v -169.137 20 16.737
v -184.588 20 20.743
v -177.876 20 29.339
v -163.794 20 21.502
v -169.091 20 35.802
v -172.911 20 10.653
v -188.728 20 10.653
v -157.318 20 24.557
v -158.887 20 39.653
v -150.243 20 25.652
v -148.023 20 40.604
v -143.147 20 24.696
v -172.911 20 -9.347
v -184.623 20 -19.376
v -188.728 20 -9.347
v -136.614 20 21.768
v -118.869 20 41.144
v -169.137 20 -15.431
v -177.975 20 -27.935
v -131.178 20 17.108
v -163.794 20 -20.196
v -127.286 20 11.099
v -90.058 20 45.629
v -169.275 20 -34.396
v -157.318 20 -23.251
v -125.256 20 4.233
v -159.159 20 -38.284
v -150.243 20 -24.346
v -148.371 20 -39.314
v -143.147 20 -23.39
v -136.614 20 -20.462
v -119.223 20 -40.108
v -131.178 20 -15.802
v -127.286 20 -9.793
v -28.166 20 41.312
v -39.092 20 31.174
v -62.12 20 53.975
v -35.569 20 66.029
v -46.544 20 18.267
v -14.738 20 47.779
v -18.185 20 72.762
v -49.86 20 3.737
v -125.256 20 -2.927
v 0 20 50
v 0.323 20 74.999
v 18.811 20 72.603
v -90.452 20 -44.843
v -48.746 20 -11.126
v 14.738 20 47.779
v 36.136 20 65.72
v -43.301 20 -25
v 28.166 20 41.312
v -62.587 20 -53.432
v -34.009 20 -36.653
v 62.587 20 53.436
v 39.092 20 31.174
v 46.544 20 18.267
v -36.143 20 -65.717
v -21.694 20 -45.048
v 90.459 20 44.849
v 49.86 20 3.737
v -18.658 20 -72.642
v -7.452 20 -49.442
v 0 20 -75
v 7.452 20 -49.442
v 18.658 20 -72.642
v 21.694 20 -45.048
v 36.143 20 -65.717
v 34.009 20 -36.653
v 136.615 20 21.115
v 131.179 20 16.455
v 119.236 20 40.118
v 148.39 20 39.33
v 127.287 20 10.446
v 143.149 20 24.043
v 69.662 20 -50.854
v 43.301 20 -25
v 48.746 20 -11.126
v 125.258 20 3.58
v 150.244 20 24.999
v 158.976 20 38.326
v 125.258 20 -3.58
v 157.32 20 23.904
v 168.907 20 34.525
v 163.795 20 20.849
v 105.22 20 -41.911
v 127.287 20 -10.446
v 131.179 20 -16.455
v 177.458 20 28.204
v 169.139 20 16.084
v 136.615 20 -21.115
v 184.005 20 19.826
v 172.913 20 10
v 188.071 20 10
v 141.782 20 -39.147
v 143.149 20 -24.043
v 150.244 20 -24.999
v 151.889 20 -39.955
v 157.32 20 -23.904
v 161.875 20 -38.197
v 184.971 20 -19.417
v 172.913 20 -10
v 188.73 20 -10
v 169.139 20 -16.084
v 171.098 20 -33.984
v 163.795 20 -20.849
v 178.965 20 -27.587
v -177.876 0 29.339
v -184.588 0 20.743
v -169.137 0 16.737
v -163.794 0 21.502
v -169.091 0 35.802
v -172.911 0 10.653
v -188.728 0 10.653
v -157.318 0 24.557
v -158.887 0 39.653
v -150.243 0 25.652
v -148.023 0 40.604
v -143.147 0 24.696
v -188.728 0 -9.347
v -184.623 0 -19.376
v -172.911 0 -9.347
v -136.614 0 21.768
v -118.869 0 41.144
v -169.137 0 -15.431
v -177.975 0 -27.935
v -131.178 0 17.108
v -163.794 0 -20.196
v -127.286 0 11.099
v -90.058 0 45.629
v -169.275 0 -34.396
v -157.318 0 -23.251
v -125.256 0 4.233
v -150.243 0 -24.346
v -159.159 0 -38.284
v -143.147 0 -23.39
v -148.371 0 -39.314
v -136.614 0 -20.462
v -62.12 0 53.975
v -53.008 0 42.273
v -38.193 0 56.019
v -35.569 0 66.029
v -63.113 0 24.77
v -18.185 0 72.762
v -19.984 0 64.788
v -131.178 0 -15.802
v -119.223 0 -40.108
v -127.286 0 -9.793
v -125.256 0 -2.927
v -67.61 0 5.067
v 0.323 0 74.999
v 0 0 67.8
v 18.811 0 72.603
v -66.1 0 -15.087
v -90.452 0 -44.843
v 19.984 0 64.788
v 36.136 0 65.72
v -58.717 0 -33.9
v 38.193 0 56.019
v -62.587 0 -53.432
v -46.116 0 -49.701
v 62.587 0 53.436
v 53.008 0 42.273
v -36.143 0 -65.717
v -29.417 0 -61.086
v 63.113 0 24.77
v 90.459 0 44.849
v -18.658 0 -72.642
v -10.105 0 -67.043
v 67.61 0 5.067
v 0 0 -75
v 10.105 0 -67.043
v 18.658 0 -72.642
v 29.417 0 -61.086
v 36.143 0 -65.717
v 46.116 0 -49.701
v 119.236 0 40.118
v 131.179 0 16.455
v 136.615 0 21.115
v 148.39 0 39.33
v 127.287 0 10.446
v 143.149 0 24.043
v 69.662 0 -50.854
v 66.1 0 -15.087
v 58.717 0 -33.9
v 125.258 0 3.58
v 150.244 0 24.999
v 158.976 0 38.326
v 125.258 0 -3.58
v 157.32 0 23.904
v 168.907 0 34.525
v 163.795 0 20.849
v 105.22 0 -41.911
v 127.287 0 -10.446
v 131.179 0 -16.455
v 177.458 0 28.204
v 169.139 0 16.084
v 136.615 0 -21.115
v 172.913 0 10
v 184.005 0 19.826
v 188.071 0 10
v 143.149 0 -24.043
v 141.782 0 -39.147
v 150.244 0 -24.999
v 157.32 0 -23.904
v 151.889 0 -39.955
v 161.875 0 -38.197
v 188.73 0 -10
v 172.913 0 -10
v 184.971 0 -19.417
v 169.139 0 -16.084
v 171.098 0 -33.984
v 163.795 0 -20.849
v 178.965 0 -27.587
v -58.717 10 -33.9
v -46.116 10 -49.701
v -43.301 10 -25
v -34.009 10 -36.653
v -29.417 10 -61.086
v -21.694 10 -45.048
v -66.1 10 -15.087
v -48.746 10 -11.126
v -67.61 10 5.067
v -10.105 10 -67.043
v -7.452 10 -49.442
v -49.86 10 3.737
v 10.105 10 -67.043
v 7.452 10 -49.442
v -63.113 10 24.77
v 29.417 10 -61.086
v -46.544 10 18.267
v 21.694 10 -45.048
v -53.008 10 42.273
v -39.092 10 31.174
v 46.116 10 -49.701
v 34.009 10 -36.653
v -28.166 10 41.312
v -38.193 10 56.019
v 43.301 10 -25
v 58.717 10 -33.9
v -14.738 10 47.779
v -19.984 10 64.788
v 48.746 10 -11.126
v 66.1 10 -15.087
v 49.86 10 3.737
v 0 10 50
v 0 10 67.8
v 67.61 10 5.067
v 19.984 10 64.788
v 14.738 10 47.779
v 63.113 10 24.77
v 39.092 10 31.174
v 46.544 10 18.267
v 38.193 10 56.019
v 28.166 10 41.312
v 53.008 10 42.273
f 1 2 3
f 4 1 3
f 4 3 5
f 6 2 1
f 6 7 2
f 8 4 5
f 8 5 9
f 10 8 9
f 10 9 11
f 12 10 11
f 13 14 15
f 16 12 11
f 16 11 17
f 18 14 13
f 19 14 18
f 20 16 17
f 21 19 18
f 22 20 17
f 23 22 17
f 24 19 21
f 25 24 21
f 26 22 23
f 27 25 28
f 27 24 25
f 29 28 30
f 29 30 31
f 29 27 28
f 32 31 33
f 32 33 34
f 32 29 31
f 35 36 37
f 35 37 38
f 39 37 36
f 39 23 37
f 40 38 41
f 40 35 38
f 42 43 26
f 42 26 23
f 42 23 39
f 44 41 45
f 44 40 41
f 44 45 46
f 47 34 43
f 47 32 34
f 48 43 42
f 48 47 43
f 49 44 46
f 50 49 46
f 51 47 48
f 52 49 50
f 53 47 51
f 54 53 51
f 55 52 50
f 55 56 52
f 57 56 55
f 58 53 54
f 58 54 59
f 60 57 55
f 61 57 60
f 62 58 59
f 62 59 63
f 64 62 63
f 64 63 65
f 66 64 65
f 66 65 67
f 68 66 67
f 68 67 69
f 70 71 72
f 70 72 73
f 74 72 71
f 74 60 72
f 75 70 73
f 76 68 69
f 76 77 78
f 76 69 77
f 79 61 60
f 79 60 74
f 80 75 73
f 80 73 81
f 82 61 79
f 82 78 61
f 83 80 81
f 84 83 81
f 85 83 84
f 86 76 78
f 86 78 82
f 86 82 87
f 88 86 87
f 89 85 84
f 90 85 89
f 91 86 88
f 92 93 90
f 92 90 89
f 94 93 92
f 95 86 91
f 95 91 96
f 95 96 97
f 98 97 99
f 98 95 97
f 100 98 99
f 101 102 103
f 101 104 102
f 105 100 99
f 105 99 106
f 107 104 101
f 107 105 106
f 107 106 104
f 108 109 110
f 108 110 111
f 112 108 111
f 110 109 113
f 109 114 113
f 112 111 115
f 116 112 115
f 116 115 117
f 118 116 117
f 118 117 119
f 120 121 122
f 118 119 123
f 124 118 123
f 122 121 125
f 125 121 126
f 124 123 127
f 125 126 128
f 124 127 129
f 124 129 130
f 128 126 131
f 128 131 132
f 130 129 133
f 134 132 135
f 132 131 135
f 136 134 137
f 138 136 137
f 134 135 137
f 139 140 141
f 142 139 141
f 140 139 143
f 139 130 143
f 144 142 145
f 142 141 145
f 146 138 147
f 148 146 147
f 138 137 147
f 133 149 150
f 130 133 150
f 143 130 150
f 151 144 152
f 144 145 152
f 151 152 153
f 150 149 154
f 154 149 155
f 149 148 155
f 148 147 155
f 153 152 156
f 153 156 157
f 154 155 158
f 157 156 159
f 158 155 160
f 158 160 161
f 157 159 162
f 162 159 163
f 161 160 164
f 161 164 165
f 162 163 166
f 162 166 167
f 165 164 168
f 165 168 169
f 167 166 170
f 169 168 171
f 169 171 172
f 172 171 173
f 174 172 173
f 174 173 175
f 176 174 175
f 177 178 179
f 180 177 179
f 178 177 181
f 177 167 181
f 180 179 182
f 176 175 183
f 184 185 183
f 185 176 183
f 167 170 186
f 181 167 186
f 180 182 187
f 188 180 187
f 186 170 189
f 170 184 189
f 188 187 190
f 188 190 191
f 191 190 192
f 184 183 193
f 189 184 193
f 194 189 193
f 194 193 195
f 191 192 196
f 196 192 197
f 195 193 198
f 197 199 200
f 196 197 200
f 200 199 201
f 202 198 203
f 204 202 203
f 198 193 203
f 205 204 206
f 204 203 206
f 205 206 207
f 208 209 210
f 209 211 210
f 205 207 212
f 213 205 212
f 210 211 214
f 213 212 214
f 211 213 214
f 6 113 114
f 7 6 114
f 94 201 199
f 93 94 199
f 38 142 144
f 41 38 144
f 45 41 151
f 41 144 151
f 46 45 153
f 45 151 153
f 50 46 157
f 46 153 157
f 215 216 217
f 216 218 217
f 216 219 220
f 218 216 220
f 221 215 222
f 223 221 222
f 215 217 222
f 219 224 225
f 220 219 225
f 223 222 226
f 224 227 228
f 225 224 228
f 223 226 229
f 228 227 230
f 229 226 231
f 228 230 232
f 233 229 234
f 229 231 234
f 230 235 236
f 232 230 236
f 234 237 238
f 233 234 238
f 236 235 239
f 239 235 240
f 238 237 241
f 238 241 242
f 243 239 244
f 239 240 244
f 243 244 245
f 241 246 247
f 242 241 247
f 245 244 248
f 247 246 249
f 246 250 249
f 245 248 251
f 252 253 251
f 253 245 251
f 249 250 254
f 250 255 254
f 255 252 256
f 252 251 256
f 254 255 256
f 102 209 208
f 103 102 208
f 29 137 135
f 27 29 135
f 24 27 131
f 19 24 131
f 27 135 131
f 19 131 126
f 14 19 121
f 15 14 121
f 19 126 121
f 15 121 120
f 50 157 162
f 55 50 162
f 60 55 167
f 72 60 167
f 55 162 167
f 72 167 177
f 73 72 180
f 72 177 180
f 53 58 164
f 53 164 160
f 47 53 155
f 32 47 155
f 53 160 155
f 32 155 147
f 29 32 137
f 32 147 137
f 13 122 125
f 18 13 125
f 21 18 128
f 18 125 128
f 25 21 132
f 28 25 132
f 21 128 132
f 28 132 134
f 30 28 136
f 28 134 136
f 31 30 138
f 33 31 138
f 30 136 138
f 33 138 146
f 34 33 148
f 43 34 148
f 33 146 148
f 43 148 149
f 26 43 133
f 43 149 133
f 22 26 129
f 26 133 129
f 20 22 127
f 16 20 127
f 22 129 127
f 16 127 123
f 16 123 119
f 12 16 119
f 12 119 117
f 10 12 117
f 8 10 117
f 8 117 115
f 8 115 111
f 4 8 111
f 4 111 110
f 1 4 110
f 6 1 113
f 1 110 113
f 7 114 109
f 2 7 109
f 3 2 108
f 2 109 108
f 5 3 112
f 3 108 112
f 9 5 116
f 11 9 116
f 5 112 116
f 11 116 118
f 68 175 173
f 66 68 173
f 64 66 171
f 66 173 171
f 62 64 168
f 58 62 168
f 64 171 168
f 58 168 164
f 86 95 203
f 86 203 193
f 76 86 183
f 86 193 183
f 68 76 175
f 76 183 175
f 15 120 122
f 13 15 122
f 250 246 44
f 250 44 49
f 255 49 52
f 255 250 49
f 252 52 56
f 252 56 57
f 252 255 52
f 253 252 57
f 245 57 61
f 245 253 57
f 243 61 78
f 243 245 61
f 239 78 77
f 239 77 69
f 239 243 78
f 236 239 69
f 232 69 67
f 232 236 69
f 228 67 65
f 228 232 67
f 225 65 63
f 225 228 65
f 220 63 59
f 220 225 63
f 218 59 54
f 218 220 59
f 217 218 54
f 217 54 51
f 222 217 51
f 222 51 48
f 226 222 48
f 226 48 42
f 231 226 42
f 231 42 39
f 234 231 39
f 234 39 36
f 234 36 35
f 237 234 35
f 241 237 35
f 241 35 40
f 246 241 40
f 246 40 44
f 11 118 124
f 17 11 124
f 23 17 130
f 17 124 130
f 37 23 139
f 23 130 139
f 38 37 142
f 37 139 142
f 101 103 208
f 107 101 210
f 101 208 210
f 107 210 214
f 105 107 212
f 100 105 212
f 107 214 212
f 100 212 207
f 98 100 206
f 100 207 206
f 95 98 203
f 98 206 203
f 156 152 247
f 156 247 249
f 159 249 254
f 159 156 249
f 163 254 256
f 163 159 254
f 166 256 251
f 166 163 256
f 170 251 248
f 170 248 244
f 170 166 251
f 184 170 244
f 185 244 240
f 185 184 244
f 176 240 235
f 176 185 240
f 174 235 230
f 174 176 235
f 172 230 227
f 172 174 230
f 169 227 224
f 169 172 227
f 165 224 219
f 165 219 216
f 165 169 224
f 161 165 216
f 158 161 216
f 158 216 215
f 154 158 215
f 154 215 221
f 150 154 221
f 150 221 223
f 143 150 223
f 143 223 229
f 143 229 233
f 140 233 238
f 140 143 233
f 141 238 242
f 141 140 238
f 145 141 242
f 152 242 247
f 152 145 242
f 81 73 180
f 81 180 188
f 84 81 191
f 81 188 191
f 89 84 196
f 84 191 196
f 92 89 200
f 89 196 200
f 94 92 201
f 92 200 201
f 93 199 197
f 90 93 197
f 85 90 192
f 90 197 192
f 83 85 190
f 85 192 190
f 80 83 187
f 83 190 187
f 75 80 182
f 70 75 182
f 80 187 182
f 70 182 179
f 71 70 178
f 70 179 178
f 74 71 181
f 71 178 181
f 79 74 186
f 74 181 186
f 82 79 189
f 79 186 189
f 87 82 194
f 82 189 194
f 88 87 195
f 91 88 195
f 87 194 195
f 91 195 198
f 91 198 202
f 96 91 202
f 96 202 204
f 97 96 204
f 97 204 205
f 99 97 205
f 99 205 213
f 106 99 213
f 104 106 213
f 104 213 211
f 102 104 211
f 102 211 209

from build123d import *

# Parameters (mm, degrees)
SKETCH1_R           = 50
BOSS_EXTRUDE1_DEPTH = 20
SKETCH2_R           = 67.8
SKETCH2_R_2         = 50
CUT_EXTRUDE2_DEPTH  = 10


with BuildPart() as part:
    # Sketch1 → Boss-Extrude1 (new body)
    with BuildSketch(Plane(origin=(0, 0, 0), x_dir=(1, 0, 0), z_dir=(0, 1, 0))):
        with BuildLine():
            Line((172.912878475, 10), (188.729833462, 10))
            ThreePointArc((188.729833462, 10), (171.097880047, 33.983517439), (141.78172432, 39.146646662))
            ThreePointArc((141.78172432, 39.146646662), (87.249696592, 45.62224876), (36.143045028, 65.716666806))
            ThreePointArc((36.143045028, 65.716666806), (0, 75), (-36.143045028, 65.716666806))
            ThreePointArc((-36.143045028, 65.716666806), (-90.451837404, 44.84292871), (-148.370630479, 39.313798563))
            ThreePointArc((-148.370630479, 39.313798563), (-173.844765312, 31.461724235), (-188.728411831, 9.346939972))
            Line((-188.728411831, 9.346939972), (-172.911456843, 9.346939972))
            ThreePointArc((-172.911456843, 9.346939972), (-124.998578369, -0.653060028), (-172.911456843, -10.653060028))
            Line((-172.911456843, -10.653060028), (-188.728411831, -10.653060028))
            ThreePointArc((-188.728411831, -10.653060028), (-173.704720096, -32.871359866), (-148.022685389, -40.604228308))
            ThreePointArc((-148.022685389, -40.604228308), (-90.057943753, -45.628827643), (-35.569454559, -66.028886878))
            ThreePointArc((-35.569454559, -66.028886878), (0.322743626, -74.999305574), (36.136409347, -65.720315881))
            ThreePointArc((36.136409347, -65.720315881), (90.458572132, -44.849413277), (148.389781211, -39.3297249))
            ThreePointArc((148.389781211, -39.3297249), (173.396792242, -31.654544351), (188.071249852, -10))
            Line((188.071249852, -10), (172.912878475, -10))
            ThreePointArc((172.912878475, -10), (125, 0), (172.912878475, 10))
        make_face()
        with Locations(Location((0, 0, 0), (0, 0, 270))):
            Circle(SKETCH1_R, mode=Mode.SUBTRACT)
    extrude(amount=BOSS_EXTRUDE1_DEPTH)

    # Sketch2 → Cut-Extrude2 (cut)
    with BuildSketch(Plane(origin=(0, 0, 0), x_dir=(1, 0, 0), z_dir=(0, 1, 0))):
        with Locations(Location((0, 0, 0), (0, 0, 270))):
            Circle(SKETCH2_R)
        with Locations(Location((0, 0, 0), (0, 0, 270))):
            Circle(SKETCH2_R_2, mode=Mode.SUBTRACT)
    extrude(amount=CUT_EXTRUDE2_DEPTH, mode=Mode.SUBTRACT)


solid = part.part
